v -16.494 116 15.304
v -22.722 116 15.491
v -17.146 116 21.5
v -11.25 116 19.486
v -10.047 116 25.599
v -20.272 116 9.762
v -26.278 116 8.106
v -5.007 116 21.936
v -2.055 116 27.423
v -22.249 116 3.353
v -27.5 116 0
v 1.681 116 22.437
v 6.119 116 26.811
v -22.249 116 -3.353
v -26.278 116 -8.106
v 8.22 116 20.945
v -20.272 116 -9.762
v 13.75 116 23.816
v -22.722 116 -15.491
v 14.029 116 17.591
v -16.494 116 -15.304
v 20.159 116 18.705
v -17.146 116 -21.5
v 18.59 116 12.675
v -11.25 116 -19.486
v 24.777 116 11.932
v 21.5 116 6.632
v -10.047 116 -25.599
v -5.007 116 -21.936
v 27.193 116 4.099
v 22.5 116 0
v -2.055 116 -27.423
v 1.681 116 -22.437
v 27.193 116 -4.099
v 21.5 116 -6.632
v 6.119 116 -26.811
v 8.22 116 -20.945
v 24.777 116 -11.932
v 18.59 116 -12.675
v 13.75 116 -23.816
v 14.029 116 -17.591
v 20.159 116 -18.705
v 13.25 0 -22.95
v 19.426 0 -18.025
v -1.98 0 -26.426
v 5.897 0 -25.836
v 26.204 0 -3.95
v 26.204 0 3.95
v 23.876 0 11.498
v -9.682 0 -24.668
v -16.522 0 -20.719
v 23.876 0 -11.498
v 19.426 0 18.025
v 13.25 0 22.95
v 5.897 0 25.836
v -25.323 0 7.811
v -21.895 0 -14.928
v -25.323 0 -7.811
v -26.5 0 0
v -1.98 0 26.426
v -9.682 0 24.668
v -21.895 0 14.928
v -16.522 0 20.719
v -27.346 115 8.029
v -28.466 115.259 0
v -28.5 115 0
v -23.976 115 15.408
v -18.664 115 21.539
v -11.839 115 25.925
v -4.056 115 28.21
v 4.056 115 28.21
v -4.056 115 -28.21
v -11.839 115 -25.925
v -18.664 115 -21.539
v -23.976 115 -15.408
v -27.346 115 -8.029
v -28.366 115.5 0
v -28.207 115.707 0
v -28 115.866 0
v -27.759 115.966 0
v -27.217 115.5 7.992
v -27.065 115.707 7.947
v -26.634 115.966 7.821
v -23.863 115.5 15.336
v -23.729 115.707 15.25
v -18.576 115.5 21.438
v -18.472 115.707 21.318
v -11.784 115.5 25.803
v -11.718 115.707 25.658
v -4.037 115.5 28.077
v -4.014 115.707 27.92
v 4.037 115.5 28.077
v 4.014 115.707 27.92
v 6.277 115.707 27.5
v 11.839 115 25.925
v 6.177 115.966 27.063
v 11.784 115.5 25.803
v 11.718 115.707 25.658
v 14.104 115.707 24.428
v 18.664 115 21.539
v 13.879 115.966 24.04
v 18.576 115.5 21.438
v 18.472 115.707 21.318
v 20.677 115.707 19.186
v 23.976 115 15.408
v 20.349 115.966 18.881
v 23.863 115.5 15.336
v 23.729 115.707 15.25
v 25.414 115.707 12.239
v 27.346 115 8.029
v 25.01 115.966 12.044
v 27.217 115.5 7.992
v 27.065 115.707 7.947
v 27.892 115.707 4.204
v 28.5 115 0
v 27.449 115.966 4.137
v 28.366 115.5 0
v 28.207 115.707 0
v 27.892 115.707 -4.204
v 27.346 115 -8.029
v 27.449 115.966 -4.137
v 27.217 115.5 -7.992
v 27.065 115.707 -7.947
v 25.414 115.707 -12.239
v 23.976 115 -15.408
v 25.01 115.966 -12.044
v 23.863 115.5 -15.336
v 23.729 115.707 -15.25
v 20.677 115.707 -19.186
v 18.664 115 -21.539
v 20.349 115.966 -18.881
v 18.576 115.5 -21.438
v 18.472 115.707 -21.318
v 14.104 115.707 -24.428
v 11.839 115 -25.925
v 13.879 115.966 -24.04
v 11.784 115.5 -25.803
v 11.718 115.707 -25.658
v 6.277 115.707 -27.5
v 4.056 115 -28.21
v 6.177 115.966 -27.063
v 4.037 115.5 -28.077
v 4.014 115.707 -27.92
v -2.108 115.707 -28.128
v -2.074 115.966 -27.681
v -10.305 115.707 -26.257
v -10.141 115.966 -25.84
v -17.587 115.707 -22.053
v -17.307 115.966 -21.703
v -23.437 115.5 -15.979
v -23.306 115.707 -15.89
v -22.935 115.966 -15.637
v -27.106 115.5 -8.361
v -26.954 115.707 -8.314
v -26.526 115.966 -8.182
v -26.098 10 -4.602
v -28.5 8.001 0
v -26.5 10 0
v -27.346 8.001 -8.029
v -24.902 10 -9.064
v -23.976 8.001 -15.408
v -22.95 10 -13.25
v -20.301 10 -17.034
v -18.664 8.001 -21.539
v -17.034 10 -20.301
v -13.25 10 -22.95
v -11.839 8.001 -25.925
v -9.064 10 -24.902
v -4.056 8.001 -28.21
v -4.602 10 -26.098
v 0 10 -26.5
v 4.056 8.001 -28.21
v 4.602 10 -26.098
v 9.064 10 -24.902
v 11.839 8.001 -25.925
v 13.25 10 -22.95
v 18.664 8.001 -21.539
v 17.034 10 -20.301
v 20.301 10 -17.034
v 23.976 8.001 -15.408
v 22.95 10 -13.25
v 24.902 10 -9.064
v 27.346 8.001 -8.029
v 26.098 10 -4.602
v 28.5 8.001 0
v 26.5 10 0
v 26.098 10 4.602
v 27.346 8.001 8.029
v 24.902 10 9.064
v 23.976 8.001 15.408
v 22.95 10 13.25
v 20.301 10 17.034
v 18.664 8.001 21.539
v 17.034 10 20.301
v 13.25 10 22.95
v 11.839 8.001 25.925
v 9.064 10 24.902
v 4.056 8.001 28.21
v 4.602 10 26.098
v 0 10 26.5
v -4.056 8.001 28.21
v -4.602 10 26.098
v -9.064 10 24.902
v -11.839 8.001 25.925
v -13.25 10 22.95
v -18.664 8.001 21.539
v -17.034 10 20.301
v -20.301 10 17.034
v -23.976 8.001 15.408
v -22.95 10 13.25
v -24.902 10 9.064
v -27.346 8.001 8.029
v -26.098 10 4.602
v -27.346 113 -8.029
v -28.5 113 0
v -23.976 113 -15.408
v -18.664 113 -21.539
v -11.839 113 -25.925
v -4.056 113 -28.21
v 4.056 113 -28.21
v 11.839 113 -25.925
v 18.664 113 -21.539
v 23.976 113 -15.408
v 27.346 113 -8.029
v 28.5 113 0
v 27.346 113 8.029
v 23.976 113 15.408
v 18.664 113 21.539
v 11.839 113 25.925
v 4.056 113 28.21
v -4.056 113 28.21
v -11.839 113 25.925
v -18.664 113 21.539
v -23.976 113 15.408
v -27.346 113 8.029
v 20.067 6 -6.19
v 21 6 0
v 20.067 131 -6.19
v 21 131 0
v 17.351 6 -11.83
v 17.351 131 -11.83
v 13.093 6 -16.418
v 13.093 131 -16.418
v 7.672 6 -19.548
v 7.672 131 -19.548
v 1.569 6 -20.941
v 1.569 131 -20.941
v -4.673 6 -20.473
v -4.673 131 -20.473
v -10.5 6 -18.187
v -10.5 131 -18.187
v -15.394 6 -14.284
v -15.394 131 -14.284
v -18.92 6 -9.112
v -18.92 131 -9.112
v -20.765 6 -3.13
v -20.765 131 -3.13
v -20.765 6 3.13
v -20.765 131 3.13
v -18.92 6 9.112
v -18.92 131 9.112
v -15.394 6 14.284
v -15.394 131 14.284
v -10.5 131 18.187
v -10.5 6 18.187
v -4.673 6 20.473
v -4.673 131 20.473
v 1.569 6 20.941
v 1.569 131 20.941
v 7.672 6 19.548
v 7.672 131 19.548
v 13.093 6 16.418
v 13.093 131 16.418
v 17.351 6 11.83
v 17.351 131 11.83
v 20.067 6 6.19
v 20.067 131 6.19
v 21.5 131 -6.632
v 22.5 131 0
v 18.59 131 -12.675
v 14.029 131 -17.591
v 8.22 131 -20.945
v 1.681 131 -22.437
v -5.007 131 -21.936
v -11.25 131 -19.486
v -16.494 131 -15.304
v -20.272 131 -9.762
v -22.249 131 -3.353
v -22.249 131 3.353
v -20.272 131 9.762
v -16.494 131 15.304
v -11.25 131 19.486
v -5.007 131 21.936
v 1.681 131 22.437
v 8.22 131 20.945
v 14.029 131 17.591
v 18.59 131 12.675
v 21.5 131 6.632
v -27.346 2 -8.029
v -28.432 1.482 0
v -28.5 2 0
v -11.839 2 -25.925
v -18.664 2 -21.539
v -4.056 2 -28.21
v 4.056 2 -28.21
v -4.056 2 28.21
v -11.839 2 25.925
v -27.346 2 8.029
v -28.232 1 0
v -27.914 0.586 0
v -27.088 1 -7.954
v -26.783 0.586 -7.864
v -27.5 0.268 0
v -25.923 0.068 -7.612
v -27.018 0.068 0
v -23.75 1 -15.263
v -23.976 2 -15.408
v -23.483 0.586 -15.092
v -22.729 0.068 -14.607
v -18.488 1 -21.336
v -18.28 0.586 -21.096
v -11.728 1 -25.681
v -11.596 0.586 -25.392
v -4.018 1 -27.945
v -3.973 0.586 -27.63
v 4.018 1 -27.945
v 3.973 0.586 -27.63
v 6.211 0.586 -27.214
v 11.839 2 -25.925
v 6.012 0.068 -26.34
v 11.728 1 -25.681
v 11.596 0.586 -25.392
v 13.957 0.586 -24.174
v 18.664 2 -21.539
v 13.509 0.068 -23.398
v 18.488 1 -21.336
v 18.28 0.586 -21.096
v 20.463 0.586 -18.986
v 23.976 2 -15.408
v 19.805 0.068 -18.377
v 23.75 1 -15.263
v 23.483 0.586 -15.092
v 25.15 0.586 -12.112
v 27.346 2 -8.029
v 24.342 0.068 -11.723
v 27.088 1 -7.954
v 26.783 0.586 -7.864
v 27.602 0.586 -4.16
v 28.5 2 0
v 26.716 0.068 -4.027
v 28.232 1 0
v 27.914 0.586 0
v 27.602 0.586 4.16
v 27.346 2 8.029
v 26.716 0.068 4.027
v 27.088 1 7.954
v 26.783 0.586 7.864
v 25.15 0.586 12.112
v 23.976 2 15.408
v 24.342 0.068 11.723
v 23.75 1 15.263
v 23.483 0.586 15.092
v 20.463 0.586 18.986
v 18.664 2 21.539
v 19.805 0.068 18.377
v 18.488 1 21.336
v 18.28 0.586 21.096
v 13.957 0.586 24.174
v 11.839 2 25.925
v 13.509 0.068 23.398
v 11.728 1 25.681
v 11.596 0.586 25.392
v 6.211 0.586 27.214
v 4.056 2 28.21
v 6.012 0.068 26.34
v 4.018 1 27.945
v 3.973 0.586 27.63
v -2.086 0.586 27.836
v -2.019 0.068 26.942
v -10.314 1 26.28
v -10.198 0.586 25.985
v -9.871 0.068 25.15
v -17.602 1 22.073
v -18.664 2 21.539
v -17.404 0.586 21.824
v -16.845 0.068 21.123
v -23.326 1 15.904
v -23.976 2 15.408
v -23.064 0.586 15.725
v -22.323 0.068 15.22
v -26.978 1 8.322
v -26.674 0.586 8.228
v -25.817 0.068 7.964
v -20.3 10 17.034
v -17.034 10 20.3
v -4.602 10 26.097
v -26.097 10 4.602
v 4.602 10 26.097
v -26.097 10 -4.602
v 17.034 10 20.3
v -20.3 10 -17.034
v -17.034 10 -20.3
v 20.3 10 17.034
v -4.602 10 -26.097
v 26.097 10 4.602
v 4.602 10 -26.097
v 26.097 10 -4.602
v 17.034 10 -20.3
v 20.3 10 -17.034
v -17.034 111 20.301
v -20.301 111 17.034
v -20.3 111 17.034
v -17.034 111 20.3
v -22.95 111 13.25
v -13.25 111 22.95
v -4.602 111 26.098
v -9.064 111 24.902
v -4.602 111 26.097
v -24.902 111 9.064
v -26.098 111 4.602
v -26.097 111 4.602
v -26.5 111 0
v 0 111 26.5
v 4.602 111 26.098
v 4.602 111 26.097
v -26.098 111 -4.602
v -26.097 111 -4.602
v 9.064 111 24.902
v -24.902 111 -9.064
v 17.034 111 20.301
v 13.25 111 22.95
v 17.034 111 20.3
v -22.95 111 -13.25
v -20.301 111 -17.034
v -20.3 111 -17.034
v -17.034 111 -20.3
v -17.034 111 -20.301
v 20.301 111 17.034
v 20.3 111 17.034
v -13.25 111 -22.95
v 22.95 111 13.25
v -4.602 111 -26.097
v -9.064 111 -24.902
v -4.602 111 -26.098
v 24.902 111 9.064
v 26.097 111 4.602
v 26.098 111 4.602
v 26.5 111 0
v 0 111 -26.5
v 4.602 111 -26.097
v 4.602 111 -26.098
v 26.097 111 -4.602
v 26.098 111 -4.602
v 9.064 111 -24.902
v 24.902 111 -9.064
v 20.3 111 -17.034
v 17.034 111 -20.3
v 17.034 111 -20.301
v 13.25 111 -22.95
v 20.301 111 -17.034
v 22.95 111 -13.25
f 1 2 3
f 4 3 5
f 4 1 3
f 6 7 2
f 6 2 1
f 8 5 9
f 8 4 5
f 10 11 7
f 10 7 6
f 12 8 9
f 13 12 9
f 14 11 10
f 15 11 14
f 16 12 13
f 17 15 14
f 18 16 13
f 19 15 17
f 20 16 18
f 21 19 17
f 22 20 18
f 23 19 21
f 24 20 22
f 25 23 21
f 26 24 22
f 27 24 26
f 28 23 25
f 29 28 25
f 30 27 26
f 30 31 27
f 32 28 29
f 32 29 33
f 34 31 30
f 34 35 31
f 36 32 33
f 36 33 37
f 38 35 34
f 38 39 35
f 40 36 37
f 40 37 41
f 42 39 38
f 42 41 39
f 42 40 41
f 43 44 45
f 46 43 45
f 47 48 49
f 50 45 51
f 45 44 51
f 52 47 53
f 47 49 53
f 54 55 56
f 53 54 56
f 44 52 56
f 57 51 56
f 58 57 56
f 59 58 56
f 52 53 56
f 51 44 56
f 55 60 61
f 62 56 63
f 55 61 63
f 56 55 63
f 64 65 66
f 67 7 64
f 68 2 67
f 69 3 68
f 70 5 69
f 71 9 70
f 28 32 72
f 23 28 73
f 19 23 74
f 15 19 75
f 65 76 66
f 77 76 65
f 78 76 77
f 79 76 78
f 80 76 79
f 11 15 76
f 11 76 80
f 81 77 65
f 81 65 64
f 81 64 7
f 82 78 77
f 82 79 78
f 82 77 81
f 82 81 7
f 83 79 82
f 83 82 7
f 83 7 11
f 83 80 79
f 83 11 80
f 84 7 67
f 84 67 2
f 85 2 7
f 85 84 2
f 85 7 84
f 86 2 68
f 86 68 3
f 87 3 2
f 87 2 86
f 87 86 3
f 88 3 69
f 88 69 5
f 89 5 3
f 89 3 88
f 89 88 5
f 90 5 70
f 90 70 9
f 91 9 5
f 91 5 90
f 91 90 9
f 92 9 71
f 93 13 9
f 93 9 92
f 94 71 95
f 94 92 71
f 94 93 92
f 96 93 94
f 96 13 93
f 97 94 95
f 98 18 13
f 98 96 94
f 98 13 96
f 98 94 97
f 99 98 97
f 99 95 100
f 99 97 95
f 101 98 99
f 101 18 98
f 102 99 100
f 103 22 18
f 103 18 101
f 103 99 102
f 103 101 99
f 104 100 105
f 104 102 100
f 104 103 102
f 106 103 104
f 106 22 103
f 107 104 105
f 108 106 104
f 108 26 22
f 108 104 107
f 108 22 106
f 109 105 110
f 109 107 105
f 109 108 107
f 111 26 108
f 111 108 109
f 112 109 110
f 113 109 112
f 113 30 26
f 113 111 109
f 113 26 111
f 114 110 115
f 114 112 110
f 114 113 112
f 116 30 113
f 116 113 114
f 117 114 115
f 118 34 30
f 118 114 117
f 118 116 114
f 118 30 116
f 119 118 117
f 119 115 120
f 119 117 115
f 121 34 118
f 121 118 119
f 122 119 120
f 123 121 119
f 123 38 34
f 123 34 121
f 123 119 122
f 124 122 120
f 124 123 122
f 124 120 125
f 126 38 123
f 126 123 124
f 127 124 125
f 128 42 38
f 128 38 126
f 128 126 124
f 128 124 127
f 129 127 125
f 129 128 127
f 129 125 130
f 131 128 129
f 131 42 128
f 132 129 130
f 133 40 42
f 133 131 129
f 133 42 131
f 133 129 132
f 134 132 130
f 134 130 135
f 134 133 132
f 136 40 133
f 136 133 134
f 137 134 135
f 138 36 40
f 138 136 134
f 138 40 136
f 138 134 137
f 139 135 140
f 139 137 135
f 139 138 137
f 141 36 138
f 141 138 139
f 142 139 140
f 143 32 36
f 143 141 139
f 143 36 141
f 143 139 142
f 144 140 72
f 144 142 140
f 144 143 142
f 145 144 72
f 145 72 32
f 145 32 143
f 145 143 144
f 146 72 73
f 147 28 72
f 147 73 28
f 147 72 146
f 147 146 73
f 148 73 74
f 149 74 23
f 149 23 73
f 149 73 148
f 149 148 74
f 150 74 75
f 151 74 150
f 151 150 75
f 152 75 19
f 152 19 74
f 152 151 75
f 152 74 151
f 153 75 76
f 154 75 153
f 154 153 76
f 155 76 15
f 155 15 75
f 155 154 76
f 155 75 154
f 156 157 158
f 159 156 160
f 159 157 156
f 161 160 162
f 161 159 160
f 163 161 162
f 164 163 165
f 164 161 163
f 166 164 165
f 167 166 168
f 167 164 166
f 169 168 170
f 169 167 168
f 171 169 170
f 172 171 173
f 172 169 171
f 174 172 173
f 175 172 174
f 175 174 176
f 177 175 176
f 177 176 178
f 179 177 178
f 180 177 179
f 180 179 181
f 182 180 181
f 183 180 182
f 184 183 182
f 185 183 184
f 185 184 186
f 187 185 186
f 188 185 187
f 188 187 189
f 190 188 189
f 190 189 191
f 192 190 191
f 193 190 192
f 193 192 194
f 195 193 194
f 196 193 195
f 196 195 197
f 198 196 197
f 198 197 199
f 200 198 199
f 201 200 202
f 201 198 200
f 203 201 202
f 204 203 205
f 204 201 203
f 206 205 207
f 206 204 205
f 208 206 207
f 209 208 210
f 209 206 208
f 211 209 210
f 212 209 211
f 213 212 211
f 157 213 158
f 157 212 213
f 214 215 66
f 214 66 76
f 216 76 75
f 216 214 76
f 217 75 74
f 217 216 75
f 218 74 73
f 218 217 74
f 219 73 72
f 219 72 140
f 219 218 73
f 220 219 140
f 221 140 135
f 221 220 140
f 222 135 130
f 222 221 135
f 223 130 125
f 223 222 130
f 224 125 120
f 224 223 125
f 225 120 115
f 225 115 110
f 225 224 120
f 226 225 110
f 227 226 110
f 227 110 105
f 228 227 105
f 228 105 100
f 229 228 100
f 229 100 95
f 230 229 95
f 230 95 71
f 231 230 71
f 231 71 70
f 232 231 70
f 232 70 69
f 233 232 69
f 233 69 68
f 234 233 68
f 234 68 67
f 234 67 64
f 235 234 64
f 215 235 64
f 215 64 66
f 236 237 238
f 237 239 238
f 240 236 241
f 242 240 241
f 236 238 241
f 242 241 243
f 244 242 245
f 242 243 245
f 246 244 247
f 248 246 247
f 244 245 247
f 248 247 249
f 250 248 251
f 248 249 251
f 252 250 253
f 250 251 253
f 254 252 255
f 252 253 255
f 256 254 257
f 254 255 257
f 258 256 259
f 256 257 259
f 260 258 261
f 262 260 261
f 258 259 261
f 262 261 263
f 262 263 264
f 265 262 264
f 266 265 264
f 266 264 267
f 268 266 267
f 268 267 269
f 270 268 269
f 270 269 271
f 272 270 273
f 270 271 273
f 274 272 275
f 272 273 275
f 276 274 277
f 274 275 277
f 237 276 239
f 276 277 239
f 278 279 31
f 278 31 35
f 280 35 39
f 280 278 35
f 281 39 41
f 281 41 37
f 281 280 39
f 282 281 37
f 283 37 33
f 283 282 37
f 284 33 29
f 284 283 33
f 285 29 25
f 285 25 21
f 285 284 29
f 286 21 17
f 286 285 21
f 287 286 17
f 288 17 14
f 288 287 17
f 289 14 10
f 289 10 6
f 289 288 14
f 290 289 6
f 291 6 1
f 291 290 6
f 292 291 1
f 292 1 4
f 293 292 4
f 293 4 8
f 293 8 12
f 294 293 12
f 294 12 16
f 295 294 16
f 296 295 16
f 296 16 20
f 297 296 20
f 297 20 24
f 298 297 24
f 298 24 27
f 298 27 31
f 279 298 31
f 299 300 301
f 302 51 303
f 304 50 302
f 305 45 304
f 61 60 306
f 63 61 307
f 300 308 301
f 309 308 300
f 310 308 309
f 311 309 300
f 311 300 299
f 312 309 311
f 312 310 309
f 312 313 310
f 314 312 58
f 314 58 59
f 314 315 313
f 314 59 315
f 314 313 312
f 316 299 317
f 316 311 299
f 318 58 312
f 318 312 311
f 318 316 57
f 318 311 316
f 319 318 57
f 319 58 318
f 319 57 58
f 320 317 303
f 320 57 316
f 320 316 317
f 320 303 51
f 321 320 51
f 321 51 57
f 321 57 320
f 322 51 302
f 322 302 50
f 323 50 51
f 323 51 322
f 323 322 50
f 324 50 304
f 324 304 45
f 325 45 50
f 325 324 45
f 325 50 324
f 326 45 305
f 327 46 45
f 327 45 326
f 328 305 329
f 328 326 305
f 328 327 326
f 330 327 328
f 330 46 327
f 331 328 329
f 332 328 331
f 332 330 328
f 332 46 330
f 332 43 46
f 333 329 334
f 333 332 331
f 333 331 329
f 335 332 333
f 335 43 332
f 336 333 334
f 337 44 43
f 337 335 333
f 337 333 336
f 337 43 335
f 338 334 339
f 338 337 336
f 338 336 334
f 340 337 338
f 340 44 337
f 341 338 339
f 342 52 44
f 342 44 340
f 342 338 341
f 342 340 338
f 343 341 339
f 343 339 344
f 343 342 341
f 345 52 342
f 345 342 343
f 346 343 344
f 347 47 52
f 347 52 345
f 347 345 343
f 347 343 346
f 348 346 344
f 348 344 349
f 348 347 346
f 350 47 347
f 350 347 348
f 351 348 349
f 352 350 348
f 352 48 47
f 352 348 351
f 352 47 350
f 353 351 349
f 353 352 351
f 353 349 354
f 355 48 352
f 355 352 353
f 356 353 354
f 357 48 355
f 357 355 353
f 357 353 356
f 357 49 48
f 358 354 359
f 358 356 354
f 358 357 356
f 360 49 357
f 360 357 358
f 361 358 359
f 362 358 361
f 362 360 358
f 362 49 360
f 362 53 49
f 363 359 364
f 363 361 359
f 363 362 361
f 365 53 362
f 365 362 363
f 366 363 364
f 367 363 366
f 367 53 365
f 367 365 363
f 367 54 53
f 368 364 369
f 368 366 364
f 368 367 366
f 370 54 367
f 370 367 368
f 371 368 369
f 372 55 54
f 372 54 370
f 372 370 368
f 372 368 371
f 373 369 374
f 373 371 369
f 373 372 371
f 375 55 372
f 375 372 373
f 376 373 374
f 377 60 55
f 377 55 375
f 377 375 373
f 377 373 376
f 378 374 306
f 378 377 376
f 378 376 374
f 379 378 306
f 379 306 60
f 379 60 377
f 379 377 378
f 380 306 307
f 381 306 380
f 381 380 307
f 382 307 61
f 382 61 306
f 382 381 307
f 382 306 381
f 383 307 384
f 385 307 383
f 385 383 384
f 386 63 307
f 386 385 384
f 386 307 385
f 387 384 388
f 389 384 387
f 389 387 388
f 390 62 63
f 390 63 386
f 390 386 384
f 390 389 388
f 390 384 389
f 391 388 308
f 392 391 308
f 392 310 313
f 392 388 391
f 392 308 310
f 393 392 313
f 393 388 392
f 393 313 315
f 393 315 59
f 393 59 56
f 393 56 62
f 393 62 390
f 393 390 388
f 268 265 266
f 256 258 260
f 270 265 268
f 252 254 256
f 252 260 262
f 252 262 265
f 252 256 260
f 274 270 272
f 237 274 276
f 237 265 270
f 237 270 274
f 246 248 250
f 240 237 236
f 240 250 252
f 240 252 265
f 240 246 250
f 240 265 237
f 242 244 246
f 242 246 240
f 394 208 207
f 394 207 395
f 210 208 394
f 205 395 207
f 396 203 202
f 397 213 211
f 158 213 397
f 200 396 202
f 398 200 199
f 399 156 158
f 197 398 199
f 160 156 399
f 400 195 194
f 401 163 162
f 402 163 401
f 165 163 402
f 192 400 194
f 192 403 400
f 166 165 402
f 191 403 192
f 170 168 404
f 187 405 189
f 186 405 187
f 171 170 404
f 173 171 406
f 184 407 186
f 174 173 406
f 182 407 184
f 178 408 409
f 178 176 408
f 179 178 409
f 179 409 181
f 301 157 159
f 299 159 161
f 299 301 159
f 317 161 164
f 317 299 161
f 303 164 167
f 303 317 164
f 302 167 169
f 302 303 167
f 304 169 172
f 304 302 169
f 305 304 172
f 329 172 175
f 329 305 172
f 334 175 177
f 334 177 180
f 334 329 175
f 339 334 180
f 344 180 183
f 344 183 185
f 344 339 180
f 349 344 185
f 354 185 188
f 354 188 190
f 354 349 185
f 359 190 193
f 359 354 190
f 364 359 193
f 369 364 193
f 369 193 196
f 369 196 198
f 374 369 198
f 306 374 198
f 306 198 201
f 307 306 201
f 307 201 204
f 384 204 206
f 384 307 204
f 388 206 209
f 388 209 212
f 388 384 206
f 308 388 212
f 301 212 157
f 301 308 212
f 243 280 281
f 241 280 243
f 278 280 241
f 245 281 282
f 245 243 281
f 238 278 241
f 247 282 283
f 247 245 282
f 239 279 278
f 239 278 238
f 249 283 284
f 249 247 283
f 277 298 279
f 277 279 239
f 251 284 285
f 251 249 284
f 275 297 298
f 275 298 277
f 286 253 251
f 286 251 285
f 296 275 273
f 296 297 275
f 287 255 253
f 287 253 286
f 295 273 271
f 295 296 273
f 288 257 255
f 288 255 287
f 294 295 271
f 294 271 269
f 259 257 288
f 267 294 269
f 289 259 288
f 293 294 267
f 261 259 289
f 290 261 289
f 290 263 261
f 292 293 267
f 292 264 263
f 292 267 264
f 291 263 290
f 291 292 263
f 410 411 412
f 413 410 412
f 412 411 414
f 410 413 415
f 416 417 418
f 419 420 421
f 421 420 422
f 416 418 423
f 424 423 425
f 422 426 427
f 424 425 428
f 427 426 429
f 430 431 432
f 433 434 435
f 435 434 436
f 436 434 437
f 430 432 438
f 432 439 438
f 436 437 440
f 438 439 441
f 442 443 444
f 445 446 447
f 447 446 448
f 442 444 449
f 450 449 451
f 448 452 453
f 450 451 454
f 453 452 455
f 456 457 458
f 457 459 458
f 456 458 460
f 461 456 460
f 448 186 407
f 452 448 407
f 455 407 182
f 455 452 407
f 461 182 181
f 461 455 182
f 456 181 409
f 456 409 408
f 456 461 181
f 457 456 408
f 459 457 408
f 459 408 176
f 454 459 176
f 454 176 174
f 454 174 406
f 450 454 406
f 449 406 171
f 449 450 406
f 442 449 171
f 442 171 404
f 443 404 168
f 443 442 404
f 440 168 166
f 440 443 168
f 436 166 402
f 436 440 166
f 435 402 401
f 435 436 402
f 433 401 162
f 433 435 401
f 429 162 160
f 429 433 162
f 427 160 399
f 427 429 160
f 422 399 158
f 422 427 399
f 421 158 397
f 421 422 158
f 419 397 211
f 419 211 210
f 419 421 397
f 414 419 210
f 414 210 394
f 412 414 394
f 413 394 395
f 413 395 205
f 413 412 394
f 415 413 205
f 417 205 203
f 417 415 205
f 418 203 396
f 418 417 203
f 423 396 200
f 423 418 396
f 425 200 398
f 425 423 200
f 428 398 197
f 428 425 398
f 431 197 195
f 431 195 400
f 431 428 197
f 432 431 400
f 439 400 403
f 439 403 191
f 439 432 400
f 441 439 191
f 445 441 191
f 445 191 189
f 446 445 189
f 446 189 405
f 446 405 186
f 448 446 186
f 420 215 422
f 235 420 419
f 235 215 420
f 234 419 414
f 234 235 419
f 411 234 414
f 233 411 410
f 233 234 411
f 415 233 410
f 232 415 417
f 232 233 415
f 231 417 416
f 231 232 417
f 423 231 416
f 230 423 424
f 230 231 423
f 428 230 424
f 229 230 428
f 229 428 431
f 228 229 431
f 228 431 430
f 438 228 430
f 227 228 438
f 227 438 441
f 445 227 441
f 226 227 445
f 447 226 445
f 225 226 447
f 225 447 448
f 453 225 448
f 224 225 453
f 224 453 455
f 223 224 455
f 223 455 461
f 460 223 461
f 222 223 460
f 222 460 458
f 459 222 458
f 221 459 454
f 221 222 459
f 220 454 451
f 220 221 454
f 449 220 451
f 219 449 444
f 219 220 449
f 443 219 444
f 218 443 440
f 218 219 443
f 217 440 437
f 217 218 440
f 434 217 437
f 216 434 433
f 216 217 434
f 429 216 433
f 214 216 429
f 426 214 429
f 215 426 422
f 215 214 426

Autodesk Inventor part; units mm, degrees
ref_plane "YZ Plane" through (0, 0, 0) normal (1, 0, 0) x (0, 1, 0)
ref_plane "XZ Plane" through (0, 0, 0) normal (0, 1, 0) x (-1, 0, 0)
sketch "Sketch1" plane through (0, 0, 0) normal (0, 1, 0) x (-1, 0, 0)
  circle A0 centre (0, 0) radius 28.5
  dimension "d0" = 57
extrude "Extrusion1" add sketch "Sketch1" along normal blind 131
sketch "Sketch2" plane through (0, 131, 0) normal (0, 1, 0) x (1, 0, 0)
  circle A0 centre (0, 0) radius 25
  circle A1 centre (0, 0) radius 22.5
  circle A2 centre (0, 0) radius 28.5
  dimension "d3" = 50
  dimension "d4" = 45
  dimension "d8" = 57
extrude "Extrusion2" cut sketch "Sketch2" against normal blind 15 contours A0 | A2
ref_plane "Work Plane2" through (0, 0, 0) normal (0, 0, 1) x (1, 0, 0)
sketch "Sketch4" plane through (0, 0, 0) normal (0, 0, 1) x (1, 0, 0)
  line L0 (28.5, 0) -> (28.5, 116) projected
  line L1 (-28.5, 116) -> (28.5, 116) projected
  line L2 (28.5, 116) -> (28.5, 111)
  line L3 (28.5, 111) -> (26.5, 111)
  line L4 (28.5, 0) -> (-28.5, 0) projected
  line L5 (28.5, 0) -> (28.5, 10)
  line L6 (28.5, 10) -> (26.5, 10)
  line L7 (26.5, 10) -> (26.5, 111)
  line L8 (28.5, 111) -> (28.5, 10)
  line L9 (0, -23.2) -> (0, 139.2) projected
  point P0 (0, 0)
  dimension "d10" = 5
  dimension "d11" = 2
  dimension "d12" = 10
  dimension "d13" = 2
revolve "Revolution1" cut sketch "Sketch4" angle 360 about axis through (0, -10, 0) along (0, 1, 0) contours L6 L7 L3 L0
chamfer "Chamfer1" distance 2 angle 45 1 edges at (28.5, 10, 0)
chamfer "Chamfer2" distance 2 angle 45 1 edges at (28.5, 111, 0)
fillet "Fillet1" radius 2 1 edges at (28.5, 0, 0)
fillet "Fillet2" radius 1 1 edges at (28.5, 116, 0)
sketch "Sketch5" plane through (0, 0, 0) normal (0, 0, 1) x (1, 0, 0)
  point P0 (0, 0)
sketch "Sketch6" plane through (0, 131, 0) normal (0, 1, 0) x (1, 0, 0)
  circle A0 centre (0, 0) radius 21
  dimension "d27" = 42
extrude "Extrusion3" cut sketch "Sketch6" against normal blind 125
properties part number "FiestaSpiceContainer"
